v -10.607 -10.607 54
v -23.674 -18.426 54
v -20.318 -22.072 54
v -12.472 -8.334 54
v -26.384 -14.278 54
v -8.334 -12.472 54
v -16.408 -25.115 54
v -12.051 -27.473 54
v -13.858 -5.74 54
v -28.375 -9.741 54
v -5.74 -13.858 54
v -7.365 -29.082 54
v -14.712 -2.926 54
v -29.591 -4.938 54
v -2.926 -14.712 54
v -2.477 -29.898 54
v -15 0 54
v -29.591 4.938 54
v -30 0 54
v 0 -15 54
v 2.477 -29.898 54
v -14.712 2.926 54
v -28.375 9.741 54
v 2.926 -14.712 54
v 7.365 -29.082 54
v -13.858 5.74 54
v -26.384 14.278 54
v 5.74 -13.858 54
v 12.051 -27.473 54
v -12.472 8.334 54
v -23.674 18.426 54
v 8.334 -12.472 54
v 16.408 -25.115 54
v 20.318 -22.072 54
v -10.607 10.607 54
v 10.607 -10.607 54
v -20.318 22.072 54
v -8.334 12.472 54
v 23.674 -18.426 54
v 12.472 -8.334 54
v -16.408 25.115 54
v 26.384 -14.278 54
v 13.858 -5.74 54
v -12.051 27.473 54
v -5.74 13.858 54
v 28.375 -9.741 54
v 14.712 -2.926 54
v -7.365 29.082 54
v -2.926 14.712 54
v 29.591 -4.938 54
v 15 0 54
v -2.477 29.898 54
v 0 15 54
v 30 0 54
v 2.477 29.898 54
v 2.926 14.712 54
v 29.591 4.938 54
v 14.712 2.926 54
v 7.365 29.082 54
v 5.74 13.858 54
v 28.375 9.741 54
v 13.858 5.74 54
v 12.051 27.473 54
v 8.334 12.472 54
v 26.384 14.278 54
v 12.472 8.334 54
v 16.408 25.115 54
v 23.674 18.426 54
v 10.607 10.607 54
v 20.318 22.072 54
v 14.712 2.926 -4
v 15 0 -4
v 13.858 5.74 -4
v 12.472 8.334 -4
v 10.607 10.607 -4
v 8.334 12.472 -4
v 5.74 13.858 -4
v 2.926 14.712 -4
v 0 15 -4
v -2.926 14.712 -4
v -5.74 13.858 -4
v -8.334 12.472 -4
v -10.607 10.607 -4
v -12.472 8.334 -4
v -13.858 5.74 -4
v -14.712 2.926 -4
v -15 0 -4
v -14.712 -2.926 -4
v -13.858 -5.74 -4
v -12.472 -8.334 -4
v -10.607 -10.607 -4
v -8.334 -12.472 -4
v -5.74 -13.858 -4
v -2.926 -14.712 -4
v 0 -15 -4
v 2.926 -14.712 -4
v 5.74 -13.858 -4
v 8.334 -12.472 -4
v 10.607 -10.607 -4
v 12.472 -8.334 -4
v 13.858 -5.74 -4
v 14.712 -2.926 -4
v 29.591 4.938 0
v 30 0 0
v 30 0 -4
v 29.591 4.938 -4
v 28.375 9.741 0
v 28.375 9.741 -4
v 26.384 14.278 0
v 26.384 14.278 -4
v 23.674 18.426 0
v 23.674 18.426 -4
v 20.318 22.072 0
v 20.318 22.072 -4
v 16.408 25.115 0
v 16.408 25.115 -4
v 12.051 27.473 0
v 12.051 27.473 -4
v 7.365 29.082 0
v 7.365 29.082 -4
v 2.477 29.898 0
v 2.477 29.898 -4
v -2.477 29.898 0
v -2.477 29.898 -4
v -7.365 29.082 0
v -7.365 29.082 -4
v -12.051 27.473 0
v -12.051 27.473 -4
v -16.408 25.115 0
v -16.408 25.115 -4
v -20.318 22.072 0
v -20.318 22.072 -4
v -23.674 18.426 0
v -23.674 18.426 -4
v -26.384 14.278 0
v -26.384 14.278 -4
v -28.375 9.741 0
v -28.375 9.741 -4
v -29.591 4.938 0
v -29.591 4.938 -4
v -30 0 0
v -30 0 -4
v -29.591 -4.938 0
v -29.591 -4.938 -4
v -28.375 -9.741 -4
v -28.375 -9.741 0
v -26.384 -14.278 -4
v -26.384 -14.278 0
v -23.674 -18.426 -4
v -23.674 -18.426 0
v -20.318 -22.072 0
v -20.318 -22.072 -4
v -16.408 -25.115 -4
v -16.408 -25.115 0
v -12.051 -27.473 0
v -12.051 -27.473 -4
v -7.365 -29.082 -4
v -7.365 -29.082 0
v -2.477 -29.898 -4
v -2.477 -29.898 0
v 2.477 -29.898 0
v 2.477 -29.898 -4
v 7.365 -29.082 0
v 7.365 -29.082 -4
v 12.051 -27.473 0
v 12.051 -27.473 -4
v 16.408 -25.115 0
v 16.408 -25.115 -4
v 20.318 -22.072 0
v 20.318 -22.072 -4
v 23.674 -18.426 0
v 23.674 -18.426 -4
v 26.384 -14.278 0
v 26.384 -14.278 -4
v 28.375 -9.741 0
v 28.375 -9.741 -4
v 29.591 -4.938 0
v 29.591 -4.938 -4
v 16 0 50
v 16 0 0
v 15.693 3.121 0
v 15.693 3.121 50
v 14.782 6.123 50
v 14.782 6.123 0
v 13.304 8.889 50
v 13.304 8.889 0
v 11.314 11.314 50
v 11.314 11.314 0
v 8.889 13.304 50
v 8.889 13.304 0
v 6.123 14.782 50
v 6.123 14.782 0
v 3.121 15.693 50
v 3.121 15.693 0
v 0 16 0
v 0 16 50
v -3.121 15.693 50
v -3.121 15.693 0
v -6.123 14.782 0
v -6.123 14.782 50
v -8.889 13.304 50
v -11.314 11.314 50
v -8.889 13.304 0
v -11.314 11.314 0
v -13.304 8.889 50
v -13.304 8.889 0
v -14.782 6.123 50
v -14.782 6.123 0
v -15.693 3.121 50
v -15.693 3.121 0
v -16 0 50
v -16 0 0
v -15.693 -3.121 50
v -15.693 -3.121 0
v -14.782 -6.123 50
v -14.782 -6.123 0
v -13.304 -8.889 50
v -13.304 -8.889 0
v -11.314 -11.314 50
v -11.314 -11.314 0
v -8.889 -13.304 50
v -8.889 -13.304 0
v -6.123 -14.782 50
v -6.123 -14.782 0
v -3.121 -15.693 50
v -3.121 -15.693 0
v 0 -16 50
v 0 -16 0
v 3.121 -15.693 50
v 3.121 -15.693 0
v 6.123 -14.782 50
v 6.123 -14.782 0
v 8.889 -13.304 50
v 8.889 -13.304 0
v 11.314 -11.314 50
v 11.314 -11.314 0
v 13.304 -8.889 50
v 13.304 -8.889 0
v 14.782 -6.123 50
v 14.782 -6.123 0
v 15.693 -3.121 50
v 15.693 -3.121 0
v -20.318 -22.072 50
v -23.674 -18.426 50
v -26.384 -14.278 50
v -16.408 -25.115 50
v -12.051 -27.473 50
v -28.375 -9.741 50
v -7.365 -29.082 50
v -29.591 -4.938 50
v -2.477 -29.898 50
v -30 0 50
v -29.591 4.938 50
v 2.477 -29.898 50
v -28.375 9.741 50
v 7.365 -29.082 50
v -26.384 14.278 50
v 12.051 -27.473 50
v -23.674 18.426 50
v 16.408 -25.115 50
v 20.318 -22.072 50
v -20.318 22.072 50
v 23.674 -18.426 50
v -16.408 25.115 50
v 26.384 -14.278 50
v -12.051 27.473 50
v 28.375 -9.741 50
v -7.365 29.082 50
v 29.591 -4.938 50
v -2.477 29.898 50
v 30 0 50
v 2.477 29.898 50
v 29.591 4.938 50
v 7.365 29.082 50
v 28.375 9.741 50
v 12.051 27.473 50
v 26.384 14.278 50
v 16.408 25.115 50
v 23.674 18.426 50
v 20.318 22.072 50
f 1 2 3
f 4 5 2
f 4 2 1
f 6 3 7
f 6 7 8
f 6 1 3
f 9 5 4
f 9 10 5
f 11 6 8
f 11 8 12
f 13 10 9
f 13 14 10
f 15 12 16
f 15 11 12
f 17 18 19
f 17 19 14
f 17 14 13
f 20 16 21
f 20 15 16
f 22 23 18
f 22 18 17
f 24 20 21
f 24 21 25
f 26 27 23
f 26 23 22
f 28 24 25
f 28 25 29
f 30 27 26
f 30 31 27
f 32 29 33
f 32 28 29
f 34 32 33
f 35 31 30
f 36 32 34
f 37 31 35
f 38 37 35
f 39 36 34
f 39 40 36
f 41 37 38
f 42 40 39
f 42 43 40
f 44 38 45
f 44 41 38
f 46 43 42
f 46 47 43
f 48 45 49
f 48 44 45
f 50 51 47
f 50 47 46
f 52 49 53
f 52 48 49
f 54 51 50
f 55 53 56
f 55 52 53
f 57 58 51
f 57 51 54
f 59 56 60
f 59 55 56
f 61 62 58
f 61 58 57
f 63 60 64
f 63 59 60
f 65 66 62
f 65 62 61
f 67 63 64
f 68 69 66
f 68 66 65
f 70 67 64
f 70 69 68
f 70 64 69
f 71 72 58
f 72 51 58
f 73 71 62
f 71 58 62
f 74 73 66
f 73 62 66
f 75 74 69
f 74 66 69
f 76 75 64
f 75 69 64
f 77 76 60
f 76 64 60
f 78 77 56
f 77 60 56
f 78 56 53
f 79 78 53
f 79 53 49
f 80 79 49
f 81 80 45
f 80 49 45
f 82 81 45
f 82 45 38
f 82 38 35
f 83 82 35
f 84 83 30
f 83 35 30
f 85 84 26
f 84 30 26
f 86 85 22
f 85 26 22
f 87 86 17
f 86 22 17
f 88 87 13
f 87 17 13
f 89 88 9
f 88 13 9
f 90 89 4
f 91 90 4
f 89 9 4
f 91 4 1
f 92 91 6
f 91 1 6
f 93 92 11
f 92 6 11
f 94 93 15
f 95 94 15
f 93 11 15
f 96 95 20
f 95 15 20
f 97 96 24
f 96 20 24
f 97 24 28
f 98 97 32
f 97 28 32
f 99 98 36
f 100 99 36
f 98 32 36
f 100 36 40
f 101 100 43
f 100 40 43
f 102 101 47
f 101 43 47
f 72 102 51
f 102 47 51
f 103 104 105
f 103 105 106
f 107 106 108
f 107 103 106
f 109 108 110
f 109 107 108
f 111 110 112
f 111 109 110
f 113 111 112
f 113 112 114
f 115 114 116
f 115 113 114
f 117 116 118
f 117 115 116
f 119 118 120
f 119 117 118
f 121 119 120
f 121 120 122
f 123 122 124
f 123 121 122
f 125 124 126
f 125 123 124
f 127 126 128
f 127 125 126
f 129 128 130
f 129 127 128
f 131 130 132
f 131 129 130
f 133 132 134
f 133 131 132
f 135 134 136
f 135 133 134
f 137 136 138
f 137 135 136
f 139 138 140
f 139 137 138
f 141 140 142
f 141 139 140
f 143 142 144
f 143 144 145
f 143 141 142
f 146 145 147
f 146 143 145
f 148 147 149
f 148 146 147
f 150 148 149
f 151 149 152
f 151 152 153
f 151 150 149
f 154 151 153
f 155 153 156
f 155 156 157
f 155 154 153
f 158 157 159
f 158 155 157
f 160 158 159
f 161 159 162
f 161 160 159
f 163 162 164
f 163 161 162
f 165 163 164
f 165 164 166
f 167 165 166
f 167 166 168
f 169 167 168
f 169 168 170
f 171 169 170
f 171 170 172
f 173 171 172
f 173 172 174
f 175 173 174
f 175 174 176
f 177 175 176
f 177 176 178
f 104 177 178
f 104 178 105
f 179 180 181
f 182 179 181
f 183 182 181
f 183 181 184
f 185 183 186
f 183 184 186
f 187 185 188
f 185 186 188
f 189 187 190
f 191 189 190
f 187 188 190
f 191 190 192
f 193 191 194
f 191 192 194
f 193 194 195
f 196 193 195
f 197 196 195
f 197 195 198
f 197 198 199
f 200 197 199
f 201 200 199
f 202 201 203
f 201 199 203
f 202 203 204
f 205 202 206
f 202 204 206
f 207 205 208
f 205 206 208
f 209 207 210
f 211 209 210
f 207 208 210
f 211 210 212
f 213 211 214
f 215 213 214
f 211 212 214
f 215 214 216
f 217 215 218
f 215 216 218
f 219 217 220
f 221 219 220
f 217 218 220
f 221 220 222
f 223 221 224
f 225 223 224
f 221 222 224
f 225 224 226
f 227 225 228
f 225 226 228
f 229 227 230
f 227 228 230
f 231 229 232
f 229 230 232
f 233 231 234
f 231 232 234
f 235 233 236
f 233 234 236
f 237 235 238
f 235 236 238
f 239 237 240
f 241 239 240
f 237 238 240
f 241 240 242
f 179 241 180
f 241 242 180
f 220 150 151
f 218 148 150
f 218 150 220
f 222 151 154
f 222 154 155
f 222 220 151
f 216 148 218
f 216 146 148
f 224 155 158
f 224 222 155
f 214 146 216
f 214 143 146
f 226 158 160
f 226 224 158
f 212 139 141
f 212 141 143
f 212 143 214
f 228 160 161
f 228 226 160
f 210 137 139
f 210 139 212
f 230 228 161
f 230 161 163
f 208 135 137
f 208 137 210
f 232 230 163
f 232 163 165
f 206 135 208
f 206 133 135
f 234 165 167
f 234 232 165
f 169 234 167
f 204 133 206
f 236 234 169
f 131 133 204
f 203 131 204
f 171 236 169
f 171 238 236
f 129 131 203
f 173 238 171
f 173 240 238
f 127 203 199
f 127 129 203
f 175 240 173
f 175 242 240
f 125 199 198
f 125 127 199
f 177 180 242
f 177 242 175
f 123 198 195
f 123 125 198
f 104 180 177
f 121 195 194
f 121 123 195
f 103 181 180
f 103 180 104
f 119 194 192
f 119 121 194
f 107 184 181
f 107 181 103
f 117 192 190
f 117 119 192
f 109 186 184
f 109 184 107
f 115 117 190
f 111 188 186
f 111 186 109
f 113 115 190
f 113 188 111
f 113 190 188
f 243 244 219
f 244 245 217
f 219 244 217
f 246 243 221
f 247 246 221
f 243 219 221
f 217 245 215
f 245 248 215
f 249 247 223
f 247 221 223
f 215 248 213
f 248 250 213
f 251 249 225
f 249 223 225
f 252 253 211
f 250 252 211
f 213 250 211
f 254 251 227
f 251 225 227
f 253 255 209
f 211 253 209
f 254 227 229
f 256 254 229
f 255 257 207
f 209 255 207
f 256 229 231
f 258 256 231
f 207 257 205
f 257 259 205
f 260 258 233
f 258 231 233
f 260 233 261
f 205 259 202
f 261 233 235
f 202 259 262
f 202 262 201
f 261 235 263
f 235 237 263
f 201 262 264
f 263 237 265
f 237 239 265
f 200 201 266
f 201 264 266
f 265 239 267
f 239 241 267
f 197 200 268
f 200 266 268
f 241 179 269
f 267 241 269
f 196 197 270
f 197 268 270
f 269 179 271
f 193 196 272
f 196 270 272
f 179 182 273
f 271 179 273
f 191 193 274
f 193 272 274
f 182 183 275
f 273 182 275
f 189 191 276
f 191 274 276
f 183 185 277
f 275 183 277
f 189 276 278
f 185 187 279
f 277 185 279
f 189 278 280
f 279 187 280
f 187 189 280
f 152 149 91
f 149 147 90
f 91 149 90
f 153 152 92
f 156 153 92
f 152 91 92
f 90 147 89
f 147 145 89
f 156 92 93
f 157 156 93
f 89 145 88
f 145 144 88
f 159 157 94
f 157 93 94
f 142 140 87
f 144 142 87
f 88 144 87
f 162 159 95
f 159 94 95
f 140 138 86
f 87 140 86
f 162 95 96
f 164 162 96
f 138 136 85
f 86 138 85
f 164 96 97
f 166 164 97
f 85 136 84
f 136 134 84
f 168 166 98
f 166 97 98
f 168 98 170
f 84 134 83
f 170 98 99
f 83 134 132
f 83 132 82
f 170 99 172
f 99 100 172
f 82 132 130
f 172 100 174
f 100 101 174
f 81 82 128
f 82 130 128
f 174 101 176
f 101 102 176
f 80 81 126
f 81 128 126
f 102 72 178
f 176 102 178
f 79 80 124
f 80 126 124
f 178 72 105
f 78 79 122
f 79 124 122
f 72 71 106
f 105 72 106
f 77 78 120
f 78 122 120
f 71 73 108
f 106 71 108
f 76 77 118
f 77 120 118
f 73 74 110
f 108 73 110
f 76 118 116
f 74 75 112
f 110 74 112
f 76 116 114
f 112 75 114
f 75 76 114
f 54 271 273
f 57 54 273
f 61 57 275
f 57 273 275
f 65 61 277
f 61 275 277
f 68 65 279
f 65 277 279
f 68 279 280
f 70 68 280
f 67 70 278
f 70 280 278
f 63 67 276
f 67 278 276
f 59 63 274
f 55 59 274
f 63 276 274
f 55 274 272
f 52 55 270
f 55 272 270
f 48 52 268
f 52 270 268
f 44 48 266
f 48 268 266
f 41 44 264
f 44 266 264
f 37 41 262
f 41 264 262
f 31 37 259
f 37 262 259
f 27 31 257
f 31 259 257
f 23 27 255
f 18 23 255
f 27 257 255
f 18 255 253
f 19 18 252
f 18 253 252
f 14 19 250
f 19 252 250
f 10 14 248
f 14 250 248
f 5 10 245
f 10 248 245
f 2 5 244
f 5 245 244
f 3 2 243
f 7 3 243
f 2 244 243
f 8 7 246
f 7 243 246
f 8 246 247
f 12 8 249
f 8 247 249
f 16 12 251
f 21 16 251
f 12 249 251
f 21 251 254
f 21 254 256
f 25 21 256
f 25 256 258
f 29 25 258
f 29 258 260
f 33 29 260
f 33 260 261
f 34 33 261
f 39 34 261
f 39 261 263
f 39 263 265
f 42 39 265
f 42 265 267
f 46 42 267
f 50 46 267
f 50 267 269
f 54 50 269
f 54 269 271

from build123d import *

# Parameters (mm, degrees)
SKETCH1_R           = 16
SKETCH1_R_2         = 15
BOSS_EXTRUDE1_DEPTH = 50
SKETCH2_R           = 30
SKETCH2_R_2         = 15
BOSS_EXTRUDE2_DEPTH = 4


with BuildPart() as part:
    # Sketch1 → Boss-Extrude1 (new body)
    with BuildSketch(Plane.XY):
        Circle(SKETCH1_R)
        Circle(SKETCH1_R_2, mode=Mode.SUBTRACT)
    extrude(amount=BOSS_EXTRUDE1_DEPTH)

    # Sketch2 → Boss-Extrude2 (add)
    with BuildSketch(Plane.XY.offset(50)):
        Circle(SKETCH2_R)
        Circle(SKETCH2_R_2, mode=Mode.SUBTRACT)
    boss_extrude2 = extrude(amount=BOSS_EXTRUDE2_DEPTH)

    # Mirror1: Boss-Extrude2 across plane
    add(boss_extrude2.mirror(Plane(origin=(0, 0, 25), x_dir=(1, 0, 0), z_dir=(0, 0, -1))))


solid = part.part
